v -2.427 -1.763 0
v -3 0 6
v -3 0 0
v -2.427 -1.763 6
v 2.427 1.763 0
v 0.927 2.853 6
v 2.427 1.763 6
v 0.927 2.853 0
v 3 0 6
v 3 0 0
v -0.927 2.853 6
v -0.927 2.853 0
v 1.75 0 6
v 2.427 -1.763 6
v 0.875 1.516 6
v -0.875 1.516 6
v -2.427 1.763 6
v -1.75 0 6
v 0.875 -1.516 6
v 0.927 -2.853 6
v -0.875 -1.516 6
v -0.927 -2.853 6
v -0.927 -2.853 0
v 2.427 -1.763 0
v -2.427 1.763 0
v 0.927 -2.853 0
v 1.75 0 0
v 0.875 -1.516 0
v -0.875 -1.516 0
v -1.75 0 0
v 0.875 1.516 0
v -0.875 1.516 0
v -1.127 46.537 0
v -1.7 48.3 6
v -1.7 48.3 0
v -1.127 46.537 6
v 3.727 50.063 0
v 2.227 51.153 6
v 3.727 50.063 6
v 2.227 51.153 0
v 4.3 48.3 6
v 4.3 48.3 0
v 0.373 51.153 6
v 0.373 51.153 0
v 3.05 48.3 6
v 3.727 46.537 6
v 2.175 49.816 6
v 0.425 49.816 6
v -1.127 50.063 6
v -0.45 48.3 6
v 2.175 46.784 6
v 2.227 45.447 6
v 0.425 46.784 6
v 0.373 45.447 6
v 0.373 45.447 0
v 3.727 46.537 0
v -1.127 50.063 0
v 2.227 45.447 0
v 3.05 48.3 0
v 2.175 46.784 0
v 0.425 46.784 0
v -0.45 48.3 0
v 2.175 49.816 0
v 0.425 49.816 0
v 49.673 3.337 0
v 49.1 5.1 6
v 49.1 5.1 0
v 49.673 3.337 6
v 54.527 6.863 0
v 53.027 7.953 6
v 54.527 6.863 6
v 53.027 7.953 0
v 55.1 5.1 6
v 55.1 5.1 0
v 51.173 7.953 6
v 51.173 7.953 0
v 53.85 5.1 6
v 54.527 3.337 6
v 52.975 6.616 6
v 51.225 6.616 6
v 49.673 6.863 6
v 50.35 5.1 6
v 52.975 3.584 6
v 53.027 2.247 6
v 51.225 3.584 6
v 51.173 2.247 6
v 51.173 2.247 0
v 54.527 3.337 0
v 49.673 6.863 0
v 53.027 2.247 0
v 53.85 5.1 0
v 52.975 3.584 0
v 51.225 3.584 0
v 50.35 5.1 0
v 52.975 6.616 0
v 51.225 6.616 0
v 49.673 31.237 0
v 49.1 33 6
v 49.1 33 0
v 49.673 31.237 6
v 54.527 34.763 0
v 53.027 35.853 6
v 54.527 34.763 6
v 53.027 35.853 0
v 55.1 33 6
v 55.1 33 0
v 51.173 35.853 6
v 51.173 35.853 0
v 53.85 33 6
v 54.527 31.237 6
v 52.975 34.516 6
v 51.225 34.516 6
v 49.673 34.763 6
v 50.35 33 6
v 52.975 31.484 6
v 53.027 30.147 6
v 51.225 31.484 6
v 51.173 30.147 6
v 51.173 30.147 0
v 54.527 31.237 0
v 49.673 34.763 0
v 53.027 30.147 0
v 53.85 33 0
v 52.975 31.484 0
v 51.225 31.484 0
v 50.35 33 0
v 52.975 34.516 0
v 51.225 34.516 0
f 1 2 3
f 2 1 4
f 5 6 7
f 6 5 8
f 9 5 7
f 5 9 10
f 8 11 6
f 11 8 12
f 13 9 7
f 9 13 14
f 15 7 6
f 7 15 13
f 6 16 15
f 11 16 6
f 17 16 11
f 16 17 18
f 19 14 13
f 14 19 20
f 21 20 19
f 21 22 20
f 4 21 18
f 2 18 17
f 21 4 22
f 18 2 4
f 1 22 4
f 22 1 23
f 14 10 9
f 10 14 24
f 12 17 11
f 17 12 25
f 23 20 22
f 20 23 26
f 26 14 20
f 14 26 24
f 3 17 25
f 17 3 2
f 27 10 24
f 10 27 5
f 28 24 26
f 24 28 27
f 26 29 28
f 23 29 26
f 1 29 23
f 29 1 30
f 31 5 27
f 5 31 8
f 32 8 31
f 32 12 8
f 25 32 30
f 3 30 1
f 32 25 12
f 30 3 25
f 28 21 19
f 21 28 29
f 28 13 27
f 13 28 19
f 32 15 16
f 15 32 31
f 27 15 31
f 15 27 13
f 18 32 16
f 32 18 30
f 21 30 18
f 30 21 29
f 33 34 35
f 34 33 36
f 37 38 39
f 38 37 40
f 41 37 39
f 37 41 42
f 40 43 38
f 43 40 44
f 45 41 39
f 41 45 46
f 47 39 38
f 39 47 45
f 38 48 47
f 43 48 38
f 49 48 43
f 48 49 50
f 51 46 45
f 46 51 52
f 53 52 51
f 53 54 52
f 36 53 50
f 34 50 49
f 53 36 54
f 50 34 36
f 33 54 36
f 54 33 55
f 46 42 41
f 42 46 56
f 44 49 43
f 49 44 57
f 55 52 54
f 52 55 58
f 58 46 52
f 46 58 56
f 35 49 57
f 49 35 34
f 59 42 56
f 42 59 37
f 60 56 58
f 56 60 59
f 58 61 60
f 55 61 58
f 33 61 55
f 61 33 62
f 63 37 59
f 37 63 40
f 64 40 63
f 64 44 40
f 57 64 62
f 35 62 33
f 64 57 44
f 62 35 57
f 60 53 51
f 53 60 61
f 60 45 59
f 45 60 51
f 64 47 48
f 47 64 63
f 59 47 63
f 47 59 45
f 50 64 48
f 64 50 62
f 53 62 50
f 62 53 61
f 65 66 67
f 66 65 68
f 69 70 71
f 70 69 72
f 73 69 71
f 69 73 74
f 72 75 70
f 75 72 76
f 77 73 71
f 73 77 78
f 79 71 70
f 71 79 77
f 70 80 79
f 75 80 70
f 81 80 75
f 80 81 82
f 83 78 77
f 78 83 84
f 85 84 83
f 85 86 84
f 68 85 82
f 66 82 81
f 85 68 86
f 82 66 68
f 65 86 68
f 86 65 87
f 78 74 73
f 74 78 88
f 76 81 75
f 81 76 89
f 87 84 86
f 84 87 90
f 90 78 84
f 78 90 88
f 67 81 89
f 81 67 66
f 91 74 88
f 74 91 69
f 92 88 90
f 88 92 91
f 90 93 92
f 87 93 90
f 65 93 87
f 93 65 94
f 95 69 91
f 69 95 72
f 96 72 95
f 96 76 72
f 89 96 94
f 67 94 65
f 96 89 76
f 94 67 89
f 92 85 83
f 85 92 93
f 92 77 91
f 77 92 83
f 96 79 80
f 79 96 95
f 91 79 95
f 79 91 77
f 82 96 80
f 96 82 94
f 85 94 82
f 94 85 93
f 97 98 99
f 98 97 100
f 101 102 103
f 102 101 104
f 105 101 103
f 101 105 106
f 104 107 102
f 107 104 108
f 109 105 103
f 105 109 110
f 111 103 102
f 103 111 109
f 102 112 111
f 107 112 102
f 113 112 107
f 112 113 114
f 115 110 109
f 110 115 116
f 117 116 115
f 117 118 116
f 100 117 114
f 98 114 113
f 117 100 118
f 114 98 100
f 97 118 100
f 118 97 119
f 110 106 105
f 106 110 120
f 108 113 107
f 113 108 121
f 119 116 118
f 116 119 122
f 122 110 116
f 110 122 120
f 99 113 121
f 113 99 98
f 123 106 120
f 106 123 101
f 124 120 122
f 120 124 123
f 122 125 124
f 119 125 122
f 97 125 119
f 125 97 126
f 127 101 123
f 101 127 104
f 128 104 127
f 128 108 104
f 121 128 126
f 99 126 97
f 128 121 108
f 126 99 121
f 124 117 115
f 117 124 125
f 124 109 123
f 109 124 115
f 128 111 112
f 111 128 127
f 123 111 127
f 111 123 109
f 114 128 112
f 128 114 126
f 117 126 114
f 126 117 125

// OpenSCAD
standoff_height = 6;
standoff_outer_radius = 3;
standoff_inner_radius = 1.75;	// hole on board is 1.6mm, 1.75 gives room for the bolts

edge_spacing = 2.5;
top_left_x_offset = 1.3;
top_left_y_offset = 53.3 - 2 * edge_spacing;
right_offset_x = 50.8 + 1.3;
right_offset_y = 5.1;
right_spacing = 27.9;

arduino_mount();

module arduino_mount(){
	standoff();	// bottom left

	translate([top_left_x_offset, top_left_y_offset, 0]){
		standoff();	// top left
	}

	translate([right_offset_x, right_offset_y, 0]){
		standoff();	// bottom right

		translate([0, right_spacing, 0]){
			standoff();	// top right
		}
	}
}

module standoff() {
	difference() {
		cylinder(r=standoff_outer_radius, h=standoff_height);
		cylinder(r=standoff_inner_radius, h=standoff_height);
	}
}
